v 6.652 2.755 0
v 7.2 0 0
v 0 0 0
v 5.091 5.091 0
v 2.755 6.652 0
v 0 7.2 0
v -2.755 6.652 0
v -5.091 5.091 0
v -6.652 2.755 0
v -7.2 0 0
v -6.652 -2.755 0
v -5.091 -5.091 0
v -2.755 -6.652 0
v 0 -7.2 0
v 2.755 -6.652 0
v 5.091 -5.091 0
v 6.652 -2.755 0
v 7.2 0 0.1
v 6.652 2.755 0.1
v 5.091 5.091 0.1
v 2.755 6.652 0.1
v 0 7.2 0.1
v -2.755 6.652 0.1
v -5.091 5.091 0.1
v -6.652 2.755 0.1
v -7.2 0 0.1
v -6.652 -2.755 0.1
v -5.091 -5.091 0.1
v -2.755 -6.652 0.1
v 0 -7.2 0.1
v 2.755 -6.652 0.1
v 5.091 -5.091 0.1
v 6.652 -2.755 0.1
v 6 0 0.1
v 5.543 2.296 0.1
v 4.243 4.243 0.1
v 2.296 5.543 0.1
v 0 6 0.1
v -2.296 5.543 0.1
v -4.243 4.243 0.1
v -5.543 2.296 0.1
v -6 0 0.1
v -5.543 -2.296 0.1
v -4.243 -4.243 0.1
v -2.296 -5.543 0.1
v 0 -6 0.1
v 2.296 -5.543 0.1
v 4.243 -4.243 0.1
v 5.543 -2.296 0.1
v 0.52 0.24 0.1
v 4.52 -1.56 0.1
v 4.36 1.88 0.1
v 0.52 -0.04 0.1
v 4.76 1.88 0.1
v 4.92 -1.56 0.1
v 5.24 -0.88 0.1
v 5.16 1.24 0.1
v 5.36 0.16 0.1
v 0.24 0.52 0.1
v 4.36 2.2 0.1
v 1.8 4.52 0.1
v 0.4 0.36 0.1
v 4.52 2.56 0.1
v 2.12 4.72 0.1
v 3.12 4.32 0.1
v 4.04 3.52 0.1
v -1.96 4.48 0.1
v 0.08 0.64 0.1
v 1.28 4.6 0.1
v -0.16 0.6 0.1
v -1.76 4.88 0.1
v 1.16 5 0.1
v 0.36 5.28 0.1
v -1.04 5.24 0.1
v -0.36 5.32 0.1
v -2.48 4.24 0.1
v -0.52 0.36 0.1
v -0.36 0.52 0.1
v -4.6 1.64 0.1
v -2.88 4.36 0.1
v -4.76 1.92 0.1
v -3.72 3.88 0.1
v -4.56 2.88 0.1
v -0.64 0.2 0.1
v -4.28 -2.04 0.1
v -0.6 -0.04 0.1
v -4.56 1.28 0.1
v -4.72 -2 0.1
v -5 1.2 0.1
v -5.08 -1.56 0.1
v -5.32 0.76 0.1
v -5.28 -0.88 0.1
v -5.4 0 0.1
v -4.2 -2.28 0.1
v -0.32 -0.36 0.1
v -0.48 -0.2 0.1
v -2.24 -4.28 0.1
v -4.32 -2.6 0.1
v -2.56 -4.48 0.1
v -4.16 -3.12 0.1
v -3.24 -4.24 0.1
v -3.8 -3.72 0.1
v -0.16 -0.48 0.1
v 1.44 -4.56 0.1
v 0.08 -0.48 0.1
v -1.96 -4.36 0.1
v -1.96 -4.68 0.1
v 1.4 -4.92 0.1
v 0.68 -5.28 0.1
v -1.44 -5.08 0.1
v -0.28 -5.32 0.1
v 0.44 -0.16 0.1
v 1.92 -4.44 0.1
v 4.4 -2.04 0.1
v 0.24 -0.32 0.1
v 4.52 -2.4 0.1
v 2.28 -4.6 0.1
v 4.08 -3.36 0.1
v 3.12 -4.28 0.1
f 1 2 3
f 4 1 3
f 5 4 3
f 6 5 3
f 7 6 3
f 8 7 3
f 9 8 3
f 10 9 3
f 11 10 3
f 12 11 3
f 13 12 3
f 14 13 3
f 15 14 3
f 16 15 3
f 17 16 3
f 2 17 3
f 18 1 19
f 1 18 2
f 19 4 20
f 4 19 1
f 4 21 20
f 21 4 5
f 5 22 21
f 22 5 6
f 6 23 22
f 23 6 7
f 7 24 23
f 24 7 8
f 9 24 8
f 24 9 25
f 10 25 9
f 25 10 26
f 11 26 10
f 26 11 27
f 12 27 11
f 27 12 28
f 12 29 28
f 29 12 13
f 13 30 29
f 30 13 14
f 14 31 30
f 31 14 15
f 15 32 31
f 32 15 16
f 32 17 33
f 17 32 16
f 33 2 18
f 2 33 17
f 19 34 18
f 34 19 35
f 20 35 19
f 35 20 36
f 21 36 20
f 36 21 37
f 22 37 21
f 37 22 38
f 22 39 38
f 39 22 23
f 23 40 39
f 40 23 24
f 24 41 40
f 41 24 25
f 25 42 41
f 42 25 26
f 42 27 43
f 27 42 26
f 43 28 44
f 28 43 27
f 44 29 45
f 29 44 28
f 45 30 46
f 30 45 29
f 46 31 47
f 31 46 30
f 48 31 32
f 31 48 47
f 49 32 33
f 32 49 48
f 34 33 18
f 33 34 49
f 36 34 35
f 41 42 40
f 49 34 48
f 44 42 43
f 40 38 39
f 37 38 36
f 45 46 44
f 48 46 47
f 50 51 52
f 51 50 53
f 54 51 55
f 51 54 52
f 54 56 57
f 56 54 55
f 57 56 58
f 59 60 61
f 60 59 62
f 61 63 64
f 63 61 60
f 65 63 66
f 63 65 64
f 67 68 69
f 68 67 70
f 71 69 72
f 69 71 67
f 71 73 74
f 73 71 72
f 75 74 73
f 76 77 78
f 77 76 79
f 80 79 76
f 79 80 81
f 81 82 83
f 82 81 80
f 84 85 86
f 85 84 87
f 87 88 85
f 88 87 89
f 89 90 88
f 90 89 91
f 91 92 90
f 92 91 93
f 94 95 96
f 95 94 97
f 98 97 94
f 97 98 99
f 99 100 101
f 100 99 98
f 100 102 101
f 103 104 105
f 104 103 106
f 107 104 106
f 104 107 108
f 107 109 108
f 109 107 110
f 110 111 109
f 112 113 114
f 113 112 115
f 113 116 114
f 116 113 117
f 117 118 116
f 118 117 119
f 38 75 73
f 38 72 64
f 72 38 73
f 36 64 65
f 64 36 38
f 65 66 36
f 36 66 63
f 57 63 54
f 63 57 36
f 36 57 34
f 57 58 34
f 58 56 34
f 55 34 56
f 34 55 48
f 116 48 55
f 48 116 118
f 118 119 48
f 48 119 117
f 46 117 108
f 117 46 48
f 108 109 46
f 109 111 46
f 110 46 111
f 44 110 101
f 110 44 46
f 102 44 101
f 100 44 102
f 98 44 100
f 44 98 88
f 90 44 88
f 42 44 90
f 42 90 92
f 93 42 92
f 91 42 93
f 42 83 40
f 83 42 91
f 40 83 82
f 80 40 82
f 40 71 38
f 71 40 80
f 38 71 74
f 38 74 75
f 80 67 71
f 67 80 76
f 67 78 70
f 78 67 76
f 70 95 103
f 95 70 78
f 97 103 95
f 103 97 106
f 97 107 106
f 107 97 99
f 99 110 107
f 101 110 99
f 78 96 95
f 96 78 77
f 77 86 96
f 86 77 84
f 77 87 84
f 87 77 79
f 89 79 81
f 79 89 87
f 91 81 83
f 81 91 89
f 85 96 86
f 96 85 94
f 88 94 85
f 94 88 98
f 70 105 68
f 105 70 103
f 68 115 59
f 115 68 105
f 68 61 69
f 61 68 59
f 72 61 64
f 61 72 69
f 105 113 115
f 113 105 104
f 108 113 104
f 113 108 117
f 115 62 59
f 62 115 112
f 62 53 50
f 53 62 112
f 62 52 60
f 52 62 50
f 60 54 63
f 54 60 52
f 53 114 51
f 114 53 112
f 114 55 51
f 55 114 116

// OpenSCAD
// file: ../p/4-4ring5.scad
use <../lib.scad>
function ldraw_lib__4_4ring5() = [
// 0 Ring  5 x 1.0
// 0 Name: 4-4ring5.dat
// 0 Author: Mark Kennedy [mkennedy]
// 0 !LDRAW_ORG Primitive UPDATE 2025-01
// 0 !LICENSE Licensed under CC BY 4.0 : see CAreadme.txt
// 
// 0 BFC CERTIFY CCW
  [0,"BFC","CERTIFY"],
  [0,"BFC","CCW"],
// 
// 0 !HISTORY 2001-10-23 [pneaster] resequenced quads, corrected winding.
// 0 !HISTORY 2001-12-29 [pneaster] Added BFC.
// 0 !HISTORY 2002-04-25 [PTadmin] Official Update 2002-02
// 0 !HISTORY 2007-06-24 [PTadmin] Header formatted for Contributor Agreement
// 0 !HISTORY 2008-07-01 [PTadmin] Official Update 2008-01
// 0 !HISTORY 2012-02-16 [Philo] Changed to CCW
// 0 !HISTORY 2012-03-30 [PTadmin] Official Update 2012-01
// 0 !HISTORY 2024-12-30 [MagFors] Recreated using PrimGen
// 0 !HISTORY 2025-01-20 [OrionP] Official Update 2025-01
// 
// 4 16 6 0 0 5.5434 0 2.2962 4.6195 0 1.9135 5 0 0
  [4,16,6,0,0,5.5434,0,2.2962,4.6195,0,1.9135,5,0,0],
// 4 16 5.5434 0 2.2962 4.2426 0 4.2426 3.5355 0 3.5355 4.6195 0 1.9135
  [4,16,5.5434,0,2.2962,4.2426,0,4.2426,3.5355,0,3.5355,4.6195,0,1.9135],
// 4 16 4.2426 0 4.2426 2.2962 0 5.5434 1.9135 0 4.6195 3.5355 0 3.5355
  [4,16,4.2426,0,4.2426,2.2962,0,5.5434,1.9135,0,4.6195,3.5355,0,3.5355],
// 4 16 2.2962 0 5.5434 0 0 6 0 0 5 1.9135 0 4.6195
  [4,16,2.2962,0,5.5434,0,0,6,0,0,5,1.9135,0,4.6195],
// 4 16 0 0 6 -2.2962 0 5.5434 -1.9135 0 4.6195 0 0 5
  [4,16,0,0,6,-2.2962,0,5.5434,-1.9135,0,4.6195,0,0,5],
// 4 16 -2.2962 0 5.5434 -4.2426 0 4.2426 -3.5355 0 3.5355 -1.9135 0 4.6195
  [4,16,-2.2962,0,5.5434,-4.2426,0,4.2426,-3.5355,0,3.5355,-1.9135,0,4.6195],
// 4 16 -4.2426 0 4.2426 -5.5434 0 2.2962 -4.6195 0 1.9135 -3.5355 0 3.5355
  [4,16,-4.2426,0,4.2426,-5.5434,0,2.2962,-4.6195,0,1.9135,-3.5355,0,3.5355],
// 4 16 -5.5434 0 2.2962 -6 0 0 -5 0 0 -4.6195 0 1.9135
  [4,16,-5.5434,0,2.2962,-6,0,0,-5,0,0,-4.6195,0,1.9135],
// 4 16 -6 0 0 -5.5434 0 -2.2962 -4.6195 0 -1.9135 -5 0 0
  [4,16,-6,0,0,-5.5434,0,-2.2962,-4.6195,0,-1.9135,-5,0,0],
// 4 16 -5.5434 0 -2.2962 -4.2426 0 -4.2426 -3.5355 0 -3.5355 -4.6195 0 -1.9135
  [4,16,-5.5434,0,-2.2962,-4.2426,0,-4.2426,-3.5355,0,-3.5355,-4.6195,0,-1.9135],
// 4 16 -4.2426 0 -4.2426 -2.2962 0 -5.5434 -1.9135 0 -4.6195 -3.5355 0 -3.5355
  [4,16,-4.2426,0,-4.2426,-2.2962,0,-5.5434,-1.9135,0,-4.6195,-3.5355,0,-3.5355],
// 4 16 -2.2962 0 -5.5434 0 0 -6 0 0 -5 -1.9135 0 -4.6195
  [4,16,-2.2962,0,-5.5434,0,0,-6,0,0,-5,-1.9135,0,-4.6195],
// 4 16 0 0 -6 2.2962 0 -5.5434 1.9135 0 -4.6195 0 0 -5
  [4,16,0,0,-6,2.2962,0,-5.5434,1.9135,0,-4.6195,0,0,-5],
// 4 16 2.2962 0 -5.5434 4.2426 0 -4.2426 3.5355 0 -3.5355 1.9135 0 -4.6195
  [4,16,2.2962,0,-5.5434,4.2426,0,-4.2426,3.5355,0,-3.5355,1.9135,0,-4.6195],
// 4 16 4.2426 0 -4.2426 5.5434 0 -2.2962 4.6195 0 -1.9135 3.5355 0 -3.5355
  [4,16,4.2426,0,-4.2426,5.5434,0,-2.2962,4.6195,0,-1.9135,3.5355,0,-3.5355],
// 4 16 5.5434 0 -2.2962 6 0 0 5 0 0 4.6195 0 -1.9135
  [4,16,5.5434,0,-2.2962,6,0,0,5,0,0,4.6195,0,-1.9135],
// 0 // Build by LDPartEditor (PrimGen 2.X)
];
module ldraw_lib__4_4ring5(step=0, col=false, unit=2/5, alt=false, line=0.2, solid=!$preview)
    makepoly(ldraw_lib__4_4ring5(), step=step, col=col, unit=unit, alt=alt, line=line, solid=solid);
ldraw_lib__4_4ring5(line=0.2);
// file: ../p/1-8chrd.scad
use <../lib.scad>
function ldraw_lib__1_8chrd() = [
// 0 Chord 0.125
// 0 Name: 1-8chrd.dat
// 0 Author: Orion Pobursky [OrionP]
// 0 !LDRAW_ORG Primitive UPDATE 2023-05
// 0 !LICENSE Licensed under CC BY 4.0 : see CAreadme.txt
// 
// 0 BFC CERTIFY CCW
  [0,"BFC","CERTIFY"],
  [0,"BFC","CCW"],
// 
// 0 !HISTORY 2004-04-22 [PTadmin] Official Update 2004-02
// 0 !HISTORY 2007-06-22 [PTadmin] Header formatted for Contributor Agreement
// 0 !HISTORY 2008-07-01 [PTadmin] Official Update 2008-01
// 0 !HISTORY 2023-10-27 [OrionP] Rebuilt with PrimGen2, original author westrate
// 0 !HISTORY 2023-10-31 [OrionP] Official Update 2023-05
// 
// 3 16 1 0 0 0.9239 0 0.3827 0.7071 0 0.7071
  [3,16,1,0,0,0.9239,0,0.3827,0.7071,0,0.7071],
];
module ldraw_lib__1_8chrd(step=0, col=false, unit=2/5, alt=false, line=0.2, solid=!$preview)
    makepoly(ldraw_lib__1_8chrd(), step=step, col=col, unit=unit, alt=alt, line=line, solid=solid);
ldraw_lib__1_8chrd(line=0.2);
// file: ../p/4-4disc.scad
use <../lib.scad>
function ldraw_lib__4_4disc() = [
// 0 Disc 1.0
// 0 Name: 4-4disc.dat
// 0 Author: James Jessiman
// 0 !LDRAW_ORG Primitive UPDATE 2002-02
// 0 !LICENSE Licensed under CC BY 4.0 : see CAreadme.txt
// 
// 0 BFC CERTIFY CCW
  [0,"BFC","CERTIFY"],
  [0,"BFC","CCW"],
// 
// 0 !HISTORY 1998-12-15 [PTadmin] Official Update 1998-10
// 0 !HISTORY 2002-03-23 [sbliss] Added BFC statement
// 0 !HISTORY 2002-04-25 [PTadmin] Official Update 2002-02
// 0 !HISTORY 2007-06-24 [PTadmin] Header formatted for Contributor Agreement
// 0 !HISTORY 2008-07-01 [PTadmin] Official Update 2008-01
// 
// 
// 3 16 0 0 0 1 0 0 0.9239 0 0.3827
  [3,16,0,0,0,1,0,0,0.9239,0,0.3827],
// 3 16 0 0 0 0.9239 0 0.3827 0.7071 0 0.7071
  [3,16,0,0,0,0.9239,0,0.3827,0.7071,0,0.7071],
// 3 16 0 0 0 0.7071 0 0.7071 0.3827 0 0.9239
  [3,16,0,0,0,0.7071,0,0.7071,0.3827,0,0.9239],
// 3 16 0 0 0 0.3827 0 0.9239 0 0 1
  [3,16,0,0,0,0.3827,0,0.9239,0,0,1],
// 3 16 0 0 0 0 0 1 -0.3827 0 0.9239
  [3,16,0,0,0,0,0,1,-0.3827,0,0.9239],
// 3 16 0 0 0 -0.3827 0 0.9239 -0.7071 0 0.7071
  [3,16,0,0,0,-0.3827,0,0.9239,-0.7071,0,0.7071],
// 3 16 0 0 0 -0.7071 0 0.7071 -0.9239 0 0.3827
  [3,16,0,0,0,-0.7071,0,0.7071,-0.9239,0,0.3827],
// 3 16 0 0 0 -0.9239 0 0.3827 -1 0 -0
  [3,16,0,0,0,-0.9239,0,0.3827,-1,0,-0],
// 3 16 0 0 0 -1 0 -0 -0.9239 0 -0.3827
  [3,16,0,0,0,-1,0,-0,-0.9239,0,-0.3827],
// 3 16 0 0 0 -0.9239 0 -0.3827 -0.7071 0 -0.7071
  [3,16,0,0,0,-0.9239,0,-0.3827,-0.7071,0,-0.7071],
// 3 16 0 0 0 -0.7071 0 -0.7071 -0.3827 0 -0.9239
  [3,16,0,0,0,-0.7071,0,-0.7071,-0.3827,0,-0.9239],
// 3 16 0 0 0 -0.3827 0 -0.9239 0 0 -1
  [3,16,0,0,0,-0.3827,0,-0.9239,0,0,-1],
// 3 16 0 0 0 0 0 -1 0.3827 0 -0.9239
  [3,16,0,0,0,0,0,-1,0.3827,0,-0.9239],
// 3 16 0 0 0 0.3827 0 -0.9239 0.7071 0 -0.7071
  [3,16,0,0,0,0.3827,0,-0.9239,0.7071,0,-0.7071],
// 3 16 0 0 0 0.7071 0 -0.7071 0.9239 0 -0.3827
  [3,16,0,0,0,0.7071,0,-0.7071,0.9239,0,-0.3827],
// 3 16 0 0 0 0.9239 0 -0.3827 1 0 0
  [3,16,0,0,0,0.9239,0,-0.3827,1,0,0],
// 0
];
module ldraw_lib__4_4disc(step=0, col=false, unit=2/5, alt=false, line=0.2, solid=!$preview)
    makepoly(ldraw_lib__4_4disc(), step=step, col=col, unit=unit, alt=alt, line=line, solid=solid);
ldraw_lib__4_4disc(line=0.2);
// file: ../p/4-4cyli.scad
use <../lib.scad>
function ldraw_lib__4_4cyli() = [
// 0 Cylinder 1.0
// 0 Name: 4-4cyli.dat
// 0 Author: James Jessiman
// 0 !LDRAW_ORG Primitive UPDATE 2005-01
// 0 !LICENSE Licensed under CC BY 4.0 : see CAreadme.txt
// 
// 0 BFC CERTIFY CCW
  [0,"BFC","CERTIFY"],
  [0,"BFC","CCW"],
// 
// 0 !HISTORY 1998-12-15 [PTadmin] Official Update 1998-10
// 0 !HISTORY 2002-03-23 [sbliss] Added BFC statement; merged headers from files in distributions LDraw 0.27 and Complete.
// 0 !HISTORY 2002-04-25 [PTadmin] Official Update 2002-02
// 0 !HISTORY 2004-12-14 [guyvivan] BFC CCW
// 0 !HISTORY 2005-12-28 [PTadmin] Official Update 2005-01
// 0 !HISTORY 2007-06-24 [PTadmin] Header formatted for Contributor Agreement
// 0 !HISTORY 2008-07-01 [PTadmin] Official Update 2008-01
// 
// 
// 4 16 1 1 0 0.9239 1 0.3827 0.9239 0 0.3827 1 0 0
  [4,16,1,1,0,0.9239,1,0.3827,0.9239,0,0.3827,1,0,0],
// 5 24 1 0 0 1 1 0 0.9239 0 0.3827 0.9239 0 -0.3827
  [5,24,1,0,0,1,1,0,0.9239,0,0.3827,0.9239,0,-0.3827],
// 4 16 0.9239 1 0.3827 0.7071 1 0.7071 0.7071 0 0.7071 0.9239 0 0.3827
  [4,16,0.9239,1,0.3827,0.7071,1,0.7071,0.7071,0,0.7071,0.9239,0,0.3827],
// 5 24 0.9239 0 0.3827 0.9239 1 0.3827 0.7071 0 0.7071 1 0 0
  [5,24,0.9239,0,0.3827,0.9239,1,0.3827,0.7071,0,0.7071,1,0,0],
// 4 16 0.7071 1 0.7071 0.3827 1 0.9239 0.3827 0 0.9239 0.7071 0 0.7071
  [4,16,0.7071,1,0.7071,0.3827,1,0.9239,0.3827,0,0.9239,0.7071,0,0.7071],
// 5 24 0.7071 0 0.7071 0.7071 1 0.7071 0.3827 0 0.9239 0.9239 0 0.3827
  [5,24,0.7071,0,0.7071,0.7071,1,0.7071,0.3827,0,0.9239,0.9239,0,0.3827],
// 4 16 0.3827 1 0.9239 0 1 1 0 0 1 0.3827 0 0.9239
  [4,16,0.3827,1,0.9239,0,1,1,0,0,1,0.3827,0,0.9239],
// 5 24 0.3827 0 0.9239 0.3827 1 0.9239 0 0 1 0.7071 0 0.7071
  [5,24,0.3827,0,0.9239,0.3827,1,0.9239,0,0,1,0.7071,0,0.7071],
// 4 16 0 1 1 -0.3827 1 0.9239 -0.3827 0 0.9239 0 0 1
  [4,16,0,1,1,-0.3827,1,0.9239,-0.3827,0,0.9239,0,0,1],
// 5 24 0 0 1 0 1 1 -0.3827 0 0.9239 0.3827 0 0.9239
  [5,24,0,0,1,0,1,1,-0.3827,0,0.9239,0.3827,0,0.9239],
// 4 16 -0.3827 1 0.9239 -0.7071 1 0.7071 -0.7071 0 0.7071 -0.3827 0 0.9239
  [4,16,-0.3827,1,0.9239,-0.7071,1,0.7071,-0.7071,0,0.7071,-0.3827,0,0.9239],
// 5 24 -0.3827 0 0.9239 -0.3827 1 0.9239 -0.7071 0 0.7071 0 0 1
  [5,24,-0.3827,0,0.9239,-0.3827,1,0.9239,-0.7071,0,0.7071,0,0,1],
// 4 16 -0.7071 1 0.7071 -0.9239 1 0.3827 -0.9239 0 0.3827 -0.7071 0 0.7071
  [4,16,-0.7071,1,0.7071,-0.9239,1,0.3827,-0.9239,0,0.3827,-0.7071,0,0.7071],
// 5 24 -0.7071 0 0.7071 -0.7071 1 0.7071 -0.9239 0 0.3827 -0.3827 0 0.9239
  [5,24,-0.7071,0,0.7071,-0.7071,1,0.7071,-0.9239,0,0.3827,-0.3827,0,0.9239],
// 4 16 -0.9239 1 0.3827 -1 1 0 -1 0 0 -0.9239 0 0.3827
  [4,16,-0.9239,1,0.3827,-1,1,0,-1,0,0,-0.9239,0,0.3827],
// 5 24 -0.9239 0 0.3827 -0.9239 1 0.3827 -1 0 0 -0.7071 0 0.7071
  [5,24,-0.9239,0,0.3827,-0.9239,1,0.3827,-1,0,0,-0.7071,0,0.7071],
// 4 16 -1 1 0 -0.9239 1 -0.3827 -0.9239 0 -0.3827 -1 0 0
  [4,16,-1,1,0,-0.9239,1,-0.3827,-0.9239,0,-0.3827,-1,0,0],
// 5 24 -1 0 0 -1 1 0 -0.9239 0 -0.3827 -0.9239 0 0.3827
  [5,24,-1,0,0,-1,1,0,-0.9239,0,-0.3827,-0.9239,0,0.3827],
// 4 16 -0.9239 1 -0.3827 -0.7071 1 -0.7071 -0.7071 0 -0.7071 -0.9239 0 -0.3827
  [4,16,-0.9239,1,-0.3827,-0.7071,1,-0.7071,-0.7071,0,-0.7071,-0.9239,0,-0.3827],
// 5 24 -0.9239 0 -0.3827 -0.9239 1 -0.3827 -0.7071 0 -0.7071 -1 0 0
  [5,24,-0.9239,0,-0.3827,-0.9239,1,-0.3827,-0.7071,0,-0.7071,-1,0,0],
// 4 16 -0.7071 1 -0.7071 -0.3827 1 -0.9239 -0.3827 0 -0.9239 -0.7071 0 -0.7071
  [4,16,-0.7071,1,-0.7071,-0.3827,1,-0.9239,-0.3827,0,-0.9239,-0.7071,0,-0.7071],
// 5 24 -0.7071 0 -0.7071 -0.7071 1 -0.7071 -0.3827 0 -0.9239 -0.9239 0 -0.3827
  [5,24,-0.7071,0,-0.7071,-0.7071,1,-0.7071,-0.3827,0,-0.9239,-0.9239,0,-0.3827],
// 4 16 -0.3827 1 -0.9239 0 1 -1 0 0 -1 -0.3827 0 -0.9239
  [4,16,-0.3827,1,-0.9239,0,1,-1,0,0,-1,-0.3827,0,-0.9239],
// 5 24 -0.3827 0 -0.9239 -0.3827 1 -0.9239 0 0 -1 -0.7071 0 -0.7071
  [5,24,-0.3827,0,-0.9239,-0.3827,1,-0.9239,0,0,-1,-0.7071,0,-0.7071],
// 4 16 0 1 -1 0.3827 1 -0.9239 0.3827 0 -0.9239 0 0 -1
  [4,16,0,1,-1,0.3827,1,-0.9239,0.3827,0,-0.9239,0,0,-1],
// 5 24 0 0 -1 0 1 -1 0.3827 0 -0.9239 -0.3827 0 -0.9239
  [5,24,0,0,-1,0,1,-1,0.3827,0,-0.9239,-0.3827,0,-0.9239],
// 4 16 0.3827 1 -0.9239 0.7071 1 -0.7071 0.7071 0 -0.7071 0.3827 0 -0.9239
  [4,16,0.3827,1,-0.9239,0.7071,1,-0.7071,0.7071,0,-0.7071,0.3827,0,-0.9239],
// 5 24 0.3827 0 -0.9239 0.3827 1 -0.9239 0.7071 0 -0.7071 0 0 -1
  [5,24,0.3827,0,-0.9239,0.3827,1,-0.9239,0.7071,0,-0.7071,0,0,-1],
// 4 16 0.7071 1 -0.7071 0.9239 1 -0.3827 0.9239 0 -0.3827 0.7071 0 -0.7071
  [4,16,0.7071,1,-0.7071,0.9239,1,-0.3827,0.9239,0,-0.3827,0.7071,0,-0.7071],
// 5 24 0.7071 0 -0.7071 0.7071 1 -0.7071 0.9239 0 -0.3827 0.3827 0 -0.9239
  [5,24,0.7071,0,-0.7071,0.7071,1,-0.7071,0.9239,0,-0.3827,0.3827,0,-0.9239],
// 4 16 0.9239 1 -0.3827 1 1 0 1 0 0 0.9239 0 -0.3827
  [4,16,0.9239,1,-0.3827,1,1,0,1,0,0,0.9239,0,-0.3827],
// 5 24 0.9239 0 -0.3827 0.9239 1 -0.3827 1 0 0 0.7071 0 -0.7071
  [5,24,0.9239,0,-0.3827,0.9239,1,-0.3827,1,0,0,0.7071,0,-0.7071],
// 0
];
module ldraw_lib__4_4cyli(step=0, col=false, unit=2/5, alt=false, line=0.2, solid=!$preview)
    makepoly(ldraw_lib__4_4cyli(), step=step, col=col, unit=unit, alt=alt, line=line, solid=solid);
ldraw_lib__4_4cyli(line=0.2);
// file: ../p/4-4cylc3.scad
use <../lib.scad>
use <4-4cyli.scad>
use <4-4disc.scad>
function ldraw_lib__4_4cylc3() = [
// 0 Cylinder Closed 1.0 without Top or Bottom Edge Lines
// 0 Name: 4-4cylc3.dat
// 0 Author: Chris Dee [cwdee]
// 0 !LDRAW_ORG Primitive UPDATE 2017-01
// 0 !LICENSE Licensed under CC BY 4.0 : see CAreadme.txt
// 
// 0 BFC CERTIFY CCW
  [0,"BFC","CERTIFY"],
  [0,"BFC","CCW"],
// 
// 0 !HISTORY 2017-12-30 [PTadmin] Official Update 2017-01
// 
// 
// 1 16 0 0 0 1 0 0 0 1 0 0 0 1 4-4disc.dat
  [1,16,0,0,0,1,0,0,0,1,0,0,0,1, ldraw_lib__4_4disc()],
// 1 16 0 0 0 1 0 0 0 1 0 0 0 1 4-4cyli.dat
  [1,16,0,0,0,1,0,0,0,1,0,0,0,1, ldraw_lib__4_4cyli()],
// 0
];
module ldraw_lib__4_4cylc3(step=0, col=false, unit=2/5, alt=false, line=0.2, solid=!$preview)
    makepoly(ldraw_lib__4_4cylc3(), step=step, col=col, unit=unit, alt=alt, line=line, solid=solid);
ldraw_lib__4_4cylc3(line=0.2);
// main file
use <../lib.scad>
use <../p/4-4cylc3.scad>
use <s/6057849bs01.scad>
function ldraw_lib__6057849b() = [
// 0 Sticker  1.8 x  1.8 with Orange Fruit Slice
// 0 Name: 6057849b.dat
// 0 Author: Takeshi Takahashi [RainbowDolphin]
// 0 !LDRAW_ORG Part UPDATE 2025-11
// 0 !LICENSE Licensed under CC BY 4.0 : see CAreadme.txt
// 
// 0 BFC CERTIFY CCW
  [0,"BFC","CERTIFY"],
  [0,"BFC","CCW"],
// 
// 0 !KEYWORDS BrickLink 41035stk01a, Brickowl 599615, Cafe, Friends, Fruit
// 0 !KEYWORDS Heartlake juice bar, Rebrickable 16264, Set 41035, Signboard
// 
// 0 !HISTORY 2025-11-30 [OrionP] Official Update 2025-11
// 
// 1 16 0 0 0 18 0 0 0 -0.25 0 0 0 18 4-4cylc3.dat
  [1,16,0,0,0,18,0,0,0,-0.25,0,0,0,18, ldraw_lib__4_4cylc3()],
// 1 191 0 0 0 1 0 0 0 1 0 0 0 1 s\6057849bs01.dat
  [1,191,0,0,0,1,0,0,0,1,0,0,0,1, ldraw_lib__s__6057849bs01()],
];
module ldraw_lib__6057849b(step=0, col=false, unit=2/5, alt=false, line=0.2, solid=!$preview)
    makepoly(ldraw_lib__6057849b(), step=step, col=col, unit=unit, alt=alt, line=line, solid=solid);
ldraw_lib__6057849b(line=0.2);
